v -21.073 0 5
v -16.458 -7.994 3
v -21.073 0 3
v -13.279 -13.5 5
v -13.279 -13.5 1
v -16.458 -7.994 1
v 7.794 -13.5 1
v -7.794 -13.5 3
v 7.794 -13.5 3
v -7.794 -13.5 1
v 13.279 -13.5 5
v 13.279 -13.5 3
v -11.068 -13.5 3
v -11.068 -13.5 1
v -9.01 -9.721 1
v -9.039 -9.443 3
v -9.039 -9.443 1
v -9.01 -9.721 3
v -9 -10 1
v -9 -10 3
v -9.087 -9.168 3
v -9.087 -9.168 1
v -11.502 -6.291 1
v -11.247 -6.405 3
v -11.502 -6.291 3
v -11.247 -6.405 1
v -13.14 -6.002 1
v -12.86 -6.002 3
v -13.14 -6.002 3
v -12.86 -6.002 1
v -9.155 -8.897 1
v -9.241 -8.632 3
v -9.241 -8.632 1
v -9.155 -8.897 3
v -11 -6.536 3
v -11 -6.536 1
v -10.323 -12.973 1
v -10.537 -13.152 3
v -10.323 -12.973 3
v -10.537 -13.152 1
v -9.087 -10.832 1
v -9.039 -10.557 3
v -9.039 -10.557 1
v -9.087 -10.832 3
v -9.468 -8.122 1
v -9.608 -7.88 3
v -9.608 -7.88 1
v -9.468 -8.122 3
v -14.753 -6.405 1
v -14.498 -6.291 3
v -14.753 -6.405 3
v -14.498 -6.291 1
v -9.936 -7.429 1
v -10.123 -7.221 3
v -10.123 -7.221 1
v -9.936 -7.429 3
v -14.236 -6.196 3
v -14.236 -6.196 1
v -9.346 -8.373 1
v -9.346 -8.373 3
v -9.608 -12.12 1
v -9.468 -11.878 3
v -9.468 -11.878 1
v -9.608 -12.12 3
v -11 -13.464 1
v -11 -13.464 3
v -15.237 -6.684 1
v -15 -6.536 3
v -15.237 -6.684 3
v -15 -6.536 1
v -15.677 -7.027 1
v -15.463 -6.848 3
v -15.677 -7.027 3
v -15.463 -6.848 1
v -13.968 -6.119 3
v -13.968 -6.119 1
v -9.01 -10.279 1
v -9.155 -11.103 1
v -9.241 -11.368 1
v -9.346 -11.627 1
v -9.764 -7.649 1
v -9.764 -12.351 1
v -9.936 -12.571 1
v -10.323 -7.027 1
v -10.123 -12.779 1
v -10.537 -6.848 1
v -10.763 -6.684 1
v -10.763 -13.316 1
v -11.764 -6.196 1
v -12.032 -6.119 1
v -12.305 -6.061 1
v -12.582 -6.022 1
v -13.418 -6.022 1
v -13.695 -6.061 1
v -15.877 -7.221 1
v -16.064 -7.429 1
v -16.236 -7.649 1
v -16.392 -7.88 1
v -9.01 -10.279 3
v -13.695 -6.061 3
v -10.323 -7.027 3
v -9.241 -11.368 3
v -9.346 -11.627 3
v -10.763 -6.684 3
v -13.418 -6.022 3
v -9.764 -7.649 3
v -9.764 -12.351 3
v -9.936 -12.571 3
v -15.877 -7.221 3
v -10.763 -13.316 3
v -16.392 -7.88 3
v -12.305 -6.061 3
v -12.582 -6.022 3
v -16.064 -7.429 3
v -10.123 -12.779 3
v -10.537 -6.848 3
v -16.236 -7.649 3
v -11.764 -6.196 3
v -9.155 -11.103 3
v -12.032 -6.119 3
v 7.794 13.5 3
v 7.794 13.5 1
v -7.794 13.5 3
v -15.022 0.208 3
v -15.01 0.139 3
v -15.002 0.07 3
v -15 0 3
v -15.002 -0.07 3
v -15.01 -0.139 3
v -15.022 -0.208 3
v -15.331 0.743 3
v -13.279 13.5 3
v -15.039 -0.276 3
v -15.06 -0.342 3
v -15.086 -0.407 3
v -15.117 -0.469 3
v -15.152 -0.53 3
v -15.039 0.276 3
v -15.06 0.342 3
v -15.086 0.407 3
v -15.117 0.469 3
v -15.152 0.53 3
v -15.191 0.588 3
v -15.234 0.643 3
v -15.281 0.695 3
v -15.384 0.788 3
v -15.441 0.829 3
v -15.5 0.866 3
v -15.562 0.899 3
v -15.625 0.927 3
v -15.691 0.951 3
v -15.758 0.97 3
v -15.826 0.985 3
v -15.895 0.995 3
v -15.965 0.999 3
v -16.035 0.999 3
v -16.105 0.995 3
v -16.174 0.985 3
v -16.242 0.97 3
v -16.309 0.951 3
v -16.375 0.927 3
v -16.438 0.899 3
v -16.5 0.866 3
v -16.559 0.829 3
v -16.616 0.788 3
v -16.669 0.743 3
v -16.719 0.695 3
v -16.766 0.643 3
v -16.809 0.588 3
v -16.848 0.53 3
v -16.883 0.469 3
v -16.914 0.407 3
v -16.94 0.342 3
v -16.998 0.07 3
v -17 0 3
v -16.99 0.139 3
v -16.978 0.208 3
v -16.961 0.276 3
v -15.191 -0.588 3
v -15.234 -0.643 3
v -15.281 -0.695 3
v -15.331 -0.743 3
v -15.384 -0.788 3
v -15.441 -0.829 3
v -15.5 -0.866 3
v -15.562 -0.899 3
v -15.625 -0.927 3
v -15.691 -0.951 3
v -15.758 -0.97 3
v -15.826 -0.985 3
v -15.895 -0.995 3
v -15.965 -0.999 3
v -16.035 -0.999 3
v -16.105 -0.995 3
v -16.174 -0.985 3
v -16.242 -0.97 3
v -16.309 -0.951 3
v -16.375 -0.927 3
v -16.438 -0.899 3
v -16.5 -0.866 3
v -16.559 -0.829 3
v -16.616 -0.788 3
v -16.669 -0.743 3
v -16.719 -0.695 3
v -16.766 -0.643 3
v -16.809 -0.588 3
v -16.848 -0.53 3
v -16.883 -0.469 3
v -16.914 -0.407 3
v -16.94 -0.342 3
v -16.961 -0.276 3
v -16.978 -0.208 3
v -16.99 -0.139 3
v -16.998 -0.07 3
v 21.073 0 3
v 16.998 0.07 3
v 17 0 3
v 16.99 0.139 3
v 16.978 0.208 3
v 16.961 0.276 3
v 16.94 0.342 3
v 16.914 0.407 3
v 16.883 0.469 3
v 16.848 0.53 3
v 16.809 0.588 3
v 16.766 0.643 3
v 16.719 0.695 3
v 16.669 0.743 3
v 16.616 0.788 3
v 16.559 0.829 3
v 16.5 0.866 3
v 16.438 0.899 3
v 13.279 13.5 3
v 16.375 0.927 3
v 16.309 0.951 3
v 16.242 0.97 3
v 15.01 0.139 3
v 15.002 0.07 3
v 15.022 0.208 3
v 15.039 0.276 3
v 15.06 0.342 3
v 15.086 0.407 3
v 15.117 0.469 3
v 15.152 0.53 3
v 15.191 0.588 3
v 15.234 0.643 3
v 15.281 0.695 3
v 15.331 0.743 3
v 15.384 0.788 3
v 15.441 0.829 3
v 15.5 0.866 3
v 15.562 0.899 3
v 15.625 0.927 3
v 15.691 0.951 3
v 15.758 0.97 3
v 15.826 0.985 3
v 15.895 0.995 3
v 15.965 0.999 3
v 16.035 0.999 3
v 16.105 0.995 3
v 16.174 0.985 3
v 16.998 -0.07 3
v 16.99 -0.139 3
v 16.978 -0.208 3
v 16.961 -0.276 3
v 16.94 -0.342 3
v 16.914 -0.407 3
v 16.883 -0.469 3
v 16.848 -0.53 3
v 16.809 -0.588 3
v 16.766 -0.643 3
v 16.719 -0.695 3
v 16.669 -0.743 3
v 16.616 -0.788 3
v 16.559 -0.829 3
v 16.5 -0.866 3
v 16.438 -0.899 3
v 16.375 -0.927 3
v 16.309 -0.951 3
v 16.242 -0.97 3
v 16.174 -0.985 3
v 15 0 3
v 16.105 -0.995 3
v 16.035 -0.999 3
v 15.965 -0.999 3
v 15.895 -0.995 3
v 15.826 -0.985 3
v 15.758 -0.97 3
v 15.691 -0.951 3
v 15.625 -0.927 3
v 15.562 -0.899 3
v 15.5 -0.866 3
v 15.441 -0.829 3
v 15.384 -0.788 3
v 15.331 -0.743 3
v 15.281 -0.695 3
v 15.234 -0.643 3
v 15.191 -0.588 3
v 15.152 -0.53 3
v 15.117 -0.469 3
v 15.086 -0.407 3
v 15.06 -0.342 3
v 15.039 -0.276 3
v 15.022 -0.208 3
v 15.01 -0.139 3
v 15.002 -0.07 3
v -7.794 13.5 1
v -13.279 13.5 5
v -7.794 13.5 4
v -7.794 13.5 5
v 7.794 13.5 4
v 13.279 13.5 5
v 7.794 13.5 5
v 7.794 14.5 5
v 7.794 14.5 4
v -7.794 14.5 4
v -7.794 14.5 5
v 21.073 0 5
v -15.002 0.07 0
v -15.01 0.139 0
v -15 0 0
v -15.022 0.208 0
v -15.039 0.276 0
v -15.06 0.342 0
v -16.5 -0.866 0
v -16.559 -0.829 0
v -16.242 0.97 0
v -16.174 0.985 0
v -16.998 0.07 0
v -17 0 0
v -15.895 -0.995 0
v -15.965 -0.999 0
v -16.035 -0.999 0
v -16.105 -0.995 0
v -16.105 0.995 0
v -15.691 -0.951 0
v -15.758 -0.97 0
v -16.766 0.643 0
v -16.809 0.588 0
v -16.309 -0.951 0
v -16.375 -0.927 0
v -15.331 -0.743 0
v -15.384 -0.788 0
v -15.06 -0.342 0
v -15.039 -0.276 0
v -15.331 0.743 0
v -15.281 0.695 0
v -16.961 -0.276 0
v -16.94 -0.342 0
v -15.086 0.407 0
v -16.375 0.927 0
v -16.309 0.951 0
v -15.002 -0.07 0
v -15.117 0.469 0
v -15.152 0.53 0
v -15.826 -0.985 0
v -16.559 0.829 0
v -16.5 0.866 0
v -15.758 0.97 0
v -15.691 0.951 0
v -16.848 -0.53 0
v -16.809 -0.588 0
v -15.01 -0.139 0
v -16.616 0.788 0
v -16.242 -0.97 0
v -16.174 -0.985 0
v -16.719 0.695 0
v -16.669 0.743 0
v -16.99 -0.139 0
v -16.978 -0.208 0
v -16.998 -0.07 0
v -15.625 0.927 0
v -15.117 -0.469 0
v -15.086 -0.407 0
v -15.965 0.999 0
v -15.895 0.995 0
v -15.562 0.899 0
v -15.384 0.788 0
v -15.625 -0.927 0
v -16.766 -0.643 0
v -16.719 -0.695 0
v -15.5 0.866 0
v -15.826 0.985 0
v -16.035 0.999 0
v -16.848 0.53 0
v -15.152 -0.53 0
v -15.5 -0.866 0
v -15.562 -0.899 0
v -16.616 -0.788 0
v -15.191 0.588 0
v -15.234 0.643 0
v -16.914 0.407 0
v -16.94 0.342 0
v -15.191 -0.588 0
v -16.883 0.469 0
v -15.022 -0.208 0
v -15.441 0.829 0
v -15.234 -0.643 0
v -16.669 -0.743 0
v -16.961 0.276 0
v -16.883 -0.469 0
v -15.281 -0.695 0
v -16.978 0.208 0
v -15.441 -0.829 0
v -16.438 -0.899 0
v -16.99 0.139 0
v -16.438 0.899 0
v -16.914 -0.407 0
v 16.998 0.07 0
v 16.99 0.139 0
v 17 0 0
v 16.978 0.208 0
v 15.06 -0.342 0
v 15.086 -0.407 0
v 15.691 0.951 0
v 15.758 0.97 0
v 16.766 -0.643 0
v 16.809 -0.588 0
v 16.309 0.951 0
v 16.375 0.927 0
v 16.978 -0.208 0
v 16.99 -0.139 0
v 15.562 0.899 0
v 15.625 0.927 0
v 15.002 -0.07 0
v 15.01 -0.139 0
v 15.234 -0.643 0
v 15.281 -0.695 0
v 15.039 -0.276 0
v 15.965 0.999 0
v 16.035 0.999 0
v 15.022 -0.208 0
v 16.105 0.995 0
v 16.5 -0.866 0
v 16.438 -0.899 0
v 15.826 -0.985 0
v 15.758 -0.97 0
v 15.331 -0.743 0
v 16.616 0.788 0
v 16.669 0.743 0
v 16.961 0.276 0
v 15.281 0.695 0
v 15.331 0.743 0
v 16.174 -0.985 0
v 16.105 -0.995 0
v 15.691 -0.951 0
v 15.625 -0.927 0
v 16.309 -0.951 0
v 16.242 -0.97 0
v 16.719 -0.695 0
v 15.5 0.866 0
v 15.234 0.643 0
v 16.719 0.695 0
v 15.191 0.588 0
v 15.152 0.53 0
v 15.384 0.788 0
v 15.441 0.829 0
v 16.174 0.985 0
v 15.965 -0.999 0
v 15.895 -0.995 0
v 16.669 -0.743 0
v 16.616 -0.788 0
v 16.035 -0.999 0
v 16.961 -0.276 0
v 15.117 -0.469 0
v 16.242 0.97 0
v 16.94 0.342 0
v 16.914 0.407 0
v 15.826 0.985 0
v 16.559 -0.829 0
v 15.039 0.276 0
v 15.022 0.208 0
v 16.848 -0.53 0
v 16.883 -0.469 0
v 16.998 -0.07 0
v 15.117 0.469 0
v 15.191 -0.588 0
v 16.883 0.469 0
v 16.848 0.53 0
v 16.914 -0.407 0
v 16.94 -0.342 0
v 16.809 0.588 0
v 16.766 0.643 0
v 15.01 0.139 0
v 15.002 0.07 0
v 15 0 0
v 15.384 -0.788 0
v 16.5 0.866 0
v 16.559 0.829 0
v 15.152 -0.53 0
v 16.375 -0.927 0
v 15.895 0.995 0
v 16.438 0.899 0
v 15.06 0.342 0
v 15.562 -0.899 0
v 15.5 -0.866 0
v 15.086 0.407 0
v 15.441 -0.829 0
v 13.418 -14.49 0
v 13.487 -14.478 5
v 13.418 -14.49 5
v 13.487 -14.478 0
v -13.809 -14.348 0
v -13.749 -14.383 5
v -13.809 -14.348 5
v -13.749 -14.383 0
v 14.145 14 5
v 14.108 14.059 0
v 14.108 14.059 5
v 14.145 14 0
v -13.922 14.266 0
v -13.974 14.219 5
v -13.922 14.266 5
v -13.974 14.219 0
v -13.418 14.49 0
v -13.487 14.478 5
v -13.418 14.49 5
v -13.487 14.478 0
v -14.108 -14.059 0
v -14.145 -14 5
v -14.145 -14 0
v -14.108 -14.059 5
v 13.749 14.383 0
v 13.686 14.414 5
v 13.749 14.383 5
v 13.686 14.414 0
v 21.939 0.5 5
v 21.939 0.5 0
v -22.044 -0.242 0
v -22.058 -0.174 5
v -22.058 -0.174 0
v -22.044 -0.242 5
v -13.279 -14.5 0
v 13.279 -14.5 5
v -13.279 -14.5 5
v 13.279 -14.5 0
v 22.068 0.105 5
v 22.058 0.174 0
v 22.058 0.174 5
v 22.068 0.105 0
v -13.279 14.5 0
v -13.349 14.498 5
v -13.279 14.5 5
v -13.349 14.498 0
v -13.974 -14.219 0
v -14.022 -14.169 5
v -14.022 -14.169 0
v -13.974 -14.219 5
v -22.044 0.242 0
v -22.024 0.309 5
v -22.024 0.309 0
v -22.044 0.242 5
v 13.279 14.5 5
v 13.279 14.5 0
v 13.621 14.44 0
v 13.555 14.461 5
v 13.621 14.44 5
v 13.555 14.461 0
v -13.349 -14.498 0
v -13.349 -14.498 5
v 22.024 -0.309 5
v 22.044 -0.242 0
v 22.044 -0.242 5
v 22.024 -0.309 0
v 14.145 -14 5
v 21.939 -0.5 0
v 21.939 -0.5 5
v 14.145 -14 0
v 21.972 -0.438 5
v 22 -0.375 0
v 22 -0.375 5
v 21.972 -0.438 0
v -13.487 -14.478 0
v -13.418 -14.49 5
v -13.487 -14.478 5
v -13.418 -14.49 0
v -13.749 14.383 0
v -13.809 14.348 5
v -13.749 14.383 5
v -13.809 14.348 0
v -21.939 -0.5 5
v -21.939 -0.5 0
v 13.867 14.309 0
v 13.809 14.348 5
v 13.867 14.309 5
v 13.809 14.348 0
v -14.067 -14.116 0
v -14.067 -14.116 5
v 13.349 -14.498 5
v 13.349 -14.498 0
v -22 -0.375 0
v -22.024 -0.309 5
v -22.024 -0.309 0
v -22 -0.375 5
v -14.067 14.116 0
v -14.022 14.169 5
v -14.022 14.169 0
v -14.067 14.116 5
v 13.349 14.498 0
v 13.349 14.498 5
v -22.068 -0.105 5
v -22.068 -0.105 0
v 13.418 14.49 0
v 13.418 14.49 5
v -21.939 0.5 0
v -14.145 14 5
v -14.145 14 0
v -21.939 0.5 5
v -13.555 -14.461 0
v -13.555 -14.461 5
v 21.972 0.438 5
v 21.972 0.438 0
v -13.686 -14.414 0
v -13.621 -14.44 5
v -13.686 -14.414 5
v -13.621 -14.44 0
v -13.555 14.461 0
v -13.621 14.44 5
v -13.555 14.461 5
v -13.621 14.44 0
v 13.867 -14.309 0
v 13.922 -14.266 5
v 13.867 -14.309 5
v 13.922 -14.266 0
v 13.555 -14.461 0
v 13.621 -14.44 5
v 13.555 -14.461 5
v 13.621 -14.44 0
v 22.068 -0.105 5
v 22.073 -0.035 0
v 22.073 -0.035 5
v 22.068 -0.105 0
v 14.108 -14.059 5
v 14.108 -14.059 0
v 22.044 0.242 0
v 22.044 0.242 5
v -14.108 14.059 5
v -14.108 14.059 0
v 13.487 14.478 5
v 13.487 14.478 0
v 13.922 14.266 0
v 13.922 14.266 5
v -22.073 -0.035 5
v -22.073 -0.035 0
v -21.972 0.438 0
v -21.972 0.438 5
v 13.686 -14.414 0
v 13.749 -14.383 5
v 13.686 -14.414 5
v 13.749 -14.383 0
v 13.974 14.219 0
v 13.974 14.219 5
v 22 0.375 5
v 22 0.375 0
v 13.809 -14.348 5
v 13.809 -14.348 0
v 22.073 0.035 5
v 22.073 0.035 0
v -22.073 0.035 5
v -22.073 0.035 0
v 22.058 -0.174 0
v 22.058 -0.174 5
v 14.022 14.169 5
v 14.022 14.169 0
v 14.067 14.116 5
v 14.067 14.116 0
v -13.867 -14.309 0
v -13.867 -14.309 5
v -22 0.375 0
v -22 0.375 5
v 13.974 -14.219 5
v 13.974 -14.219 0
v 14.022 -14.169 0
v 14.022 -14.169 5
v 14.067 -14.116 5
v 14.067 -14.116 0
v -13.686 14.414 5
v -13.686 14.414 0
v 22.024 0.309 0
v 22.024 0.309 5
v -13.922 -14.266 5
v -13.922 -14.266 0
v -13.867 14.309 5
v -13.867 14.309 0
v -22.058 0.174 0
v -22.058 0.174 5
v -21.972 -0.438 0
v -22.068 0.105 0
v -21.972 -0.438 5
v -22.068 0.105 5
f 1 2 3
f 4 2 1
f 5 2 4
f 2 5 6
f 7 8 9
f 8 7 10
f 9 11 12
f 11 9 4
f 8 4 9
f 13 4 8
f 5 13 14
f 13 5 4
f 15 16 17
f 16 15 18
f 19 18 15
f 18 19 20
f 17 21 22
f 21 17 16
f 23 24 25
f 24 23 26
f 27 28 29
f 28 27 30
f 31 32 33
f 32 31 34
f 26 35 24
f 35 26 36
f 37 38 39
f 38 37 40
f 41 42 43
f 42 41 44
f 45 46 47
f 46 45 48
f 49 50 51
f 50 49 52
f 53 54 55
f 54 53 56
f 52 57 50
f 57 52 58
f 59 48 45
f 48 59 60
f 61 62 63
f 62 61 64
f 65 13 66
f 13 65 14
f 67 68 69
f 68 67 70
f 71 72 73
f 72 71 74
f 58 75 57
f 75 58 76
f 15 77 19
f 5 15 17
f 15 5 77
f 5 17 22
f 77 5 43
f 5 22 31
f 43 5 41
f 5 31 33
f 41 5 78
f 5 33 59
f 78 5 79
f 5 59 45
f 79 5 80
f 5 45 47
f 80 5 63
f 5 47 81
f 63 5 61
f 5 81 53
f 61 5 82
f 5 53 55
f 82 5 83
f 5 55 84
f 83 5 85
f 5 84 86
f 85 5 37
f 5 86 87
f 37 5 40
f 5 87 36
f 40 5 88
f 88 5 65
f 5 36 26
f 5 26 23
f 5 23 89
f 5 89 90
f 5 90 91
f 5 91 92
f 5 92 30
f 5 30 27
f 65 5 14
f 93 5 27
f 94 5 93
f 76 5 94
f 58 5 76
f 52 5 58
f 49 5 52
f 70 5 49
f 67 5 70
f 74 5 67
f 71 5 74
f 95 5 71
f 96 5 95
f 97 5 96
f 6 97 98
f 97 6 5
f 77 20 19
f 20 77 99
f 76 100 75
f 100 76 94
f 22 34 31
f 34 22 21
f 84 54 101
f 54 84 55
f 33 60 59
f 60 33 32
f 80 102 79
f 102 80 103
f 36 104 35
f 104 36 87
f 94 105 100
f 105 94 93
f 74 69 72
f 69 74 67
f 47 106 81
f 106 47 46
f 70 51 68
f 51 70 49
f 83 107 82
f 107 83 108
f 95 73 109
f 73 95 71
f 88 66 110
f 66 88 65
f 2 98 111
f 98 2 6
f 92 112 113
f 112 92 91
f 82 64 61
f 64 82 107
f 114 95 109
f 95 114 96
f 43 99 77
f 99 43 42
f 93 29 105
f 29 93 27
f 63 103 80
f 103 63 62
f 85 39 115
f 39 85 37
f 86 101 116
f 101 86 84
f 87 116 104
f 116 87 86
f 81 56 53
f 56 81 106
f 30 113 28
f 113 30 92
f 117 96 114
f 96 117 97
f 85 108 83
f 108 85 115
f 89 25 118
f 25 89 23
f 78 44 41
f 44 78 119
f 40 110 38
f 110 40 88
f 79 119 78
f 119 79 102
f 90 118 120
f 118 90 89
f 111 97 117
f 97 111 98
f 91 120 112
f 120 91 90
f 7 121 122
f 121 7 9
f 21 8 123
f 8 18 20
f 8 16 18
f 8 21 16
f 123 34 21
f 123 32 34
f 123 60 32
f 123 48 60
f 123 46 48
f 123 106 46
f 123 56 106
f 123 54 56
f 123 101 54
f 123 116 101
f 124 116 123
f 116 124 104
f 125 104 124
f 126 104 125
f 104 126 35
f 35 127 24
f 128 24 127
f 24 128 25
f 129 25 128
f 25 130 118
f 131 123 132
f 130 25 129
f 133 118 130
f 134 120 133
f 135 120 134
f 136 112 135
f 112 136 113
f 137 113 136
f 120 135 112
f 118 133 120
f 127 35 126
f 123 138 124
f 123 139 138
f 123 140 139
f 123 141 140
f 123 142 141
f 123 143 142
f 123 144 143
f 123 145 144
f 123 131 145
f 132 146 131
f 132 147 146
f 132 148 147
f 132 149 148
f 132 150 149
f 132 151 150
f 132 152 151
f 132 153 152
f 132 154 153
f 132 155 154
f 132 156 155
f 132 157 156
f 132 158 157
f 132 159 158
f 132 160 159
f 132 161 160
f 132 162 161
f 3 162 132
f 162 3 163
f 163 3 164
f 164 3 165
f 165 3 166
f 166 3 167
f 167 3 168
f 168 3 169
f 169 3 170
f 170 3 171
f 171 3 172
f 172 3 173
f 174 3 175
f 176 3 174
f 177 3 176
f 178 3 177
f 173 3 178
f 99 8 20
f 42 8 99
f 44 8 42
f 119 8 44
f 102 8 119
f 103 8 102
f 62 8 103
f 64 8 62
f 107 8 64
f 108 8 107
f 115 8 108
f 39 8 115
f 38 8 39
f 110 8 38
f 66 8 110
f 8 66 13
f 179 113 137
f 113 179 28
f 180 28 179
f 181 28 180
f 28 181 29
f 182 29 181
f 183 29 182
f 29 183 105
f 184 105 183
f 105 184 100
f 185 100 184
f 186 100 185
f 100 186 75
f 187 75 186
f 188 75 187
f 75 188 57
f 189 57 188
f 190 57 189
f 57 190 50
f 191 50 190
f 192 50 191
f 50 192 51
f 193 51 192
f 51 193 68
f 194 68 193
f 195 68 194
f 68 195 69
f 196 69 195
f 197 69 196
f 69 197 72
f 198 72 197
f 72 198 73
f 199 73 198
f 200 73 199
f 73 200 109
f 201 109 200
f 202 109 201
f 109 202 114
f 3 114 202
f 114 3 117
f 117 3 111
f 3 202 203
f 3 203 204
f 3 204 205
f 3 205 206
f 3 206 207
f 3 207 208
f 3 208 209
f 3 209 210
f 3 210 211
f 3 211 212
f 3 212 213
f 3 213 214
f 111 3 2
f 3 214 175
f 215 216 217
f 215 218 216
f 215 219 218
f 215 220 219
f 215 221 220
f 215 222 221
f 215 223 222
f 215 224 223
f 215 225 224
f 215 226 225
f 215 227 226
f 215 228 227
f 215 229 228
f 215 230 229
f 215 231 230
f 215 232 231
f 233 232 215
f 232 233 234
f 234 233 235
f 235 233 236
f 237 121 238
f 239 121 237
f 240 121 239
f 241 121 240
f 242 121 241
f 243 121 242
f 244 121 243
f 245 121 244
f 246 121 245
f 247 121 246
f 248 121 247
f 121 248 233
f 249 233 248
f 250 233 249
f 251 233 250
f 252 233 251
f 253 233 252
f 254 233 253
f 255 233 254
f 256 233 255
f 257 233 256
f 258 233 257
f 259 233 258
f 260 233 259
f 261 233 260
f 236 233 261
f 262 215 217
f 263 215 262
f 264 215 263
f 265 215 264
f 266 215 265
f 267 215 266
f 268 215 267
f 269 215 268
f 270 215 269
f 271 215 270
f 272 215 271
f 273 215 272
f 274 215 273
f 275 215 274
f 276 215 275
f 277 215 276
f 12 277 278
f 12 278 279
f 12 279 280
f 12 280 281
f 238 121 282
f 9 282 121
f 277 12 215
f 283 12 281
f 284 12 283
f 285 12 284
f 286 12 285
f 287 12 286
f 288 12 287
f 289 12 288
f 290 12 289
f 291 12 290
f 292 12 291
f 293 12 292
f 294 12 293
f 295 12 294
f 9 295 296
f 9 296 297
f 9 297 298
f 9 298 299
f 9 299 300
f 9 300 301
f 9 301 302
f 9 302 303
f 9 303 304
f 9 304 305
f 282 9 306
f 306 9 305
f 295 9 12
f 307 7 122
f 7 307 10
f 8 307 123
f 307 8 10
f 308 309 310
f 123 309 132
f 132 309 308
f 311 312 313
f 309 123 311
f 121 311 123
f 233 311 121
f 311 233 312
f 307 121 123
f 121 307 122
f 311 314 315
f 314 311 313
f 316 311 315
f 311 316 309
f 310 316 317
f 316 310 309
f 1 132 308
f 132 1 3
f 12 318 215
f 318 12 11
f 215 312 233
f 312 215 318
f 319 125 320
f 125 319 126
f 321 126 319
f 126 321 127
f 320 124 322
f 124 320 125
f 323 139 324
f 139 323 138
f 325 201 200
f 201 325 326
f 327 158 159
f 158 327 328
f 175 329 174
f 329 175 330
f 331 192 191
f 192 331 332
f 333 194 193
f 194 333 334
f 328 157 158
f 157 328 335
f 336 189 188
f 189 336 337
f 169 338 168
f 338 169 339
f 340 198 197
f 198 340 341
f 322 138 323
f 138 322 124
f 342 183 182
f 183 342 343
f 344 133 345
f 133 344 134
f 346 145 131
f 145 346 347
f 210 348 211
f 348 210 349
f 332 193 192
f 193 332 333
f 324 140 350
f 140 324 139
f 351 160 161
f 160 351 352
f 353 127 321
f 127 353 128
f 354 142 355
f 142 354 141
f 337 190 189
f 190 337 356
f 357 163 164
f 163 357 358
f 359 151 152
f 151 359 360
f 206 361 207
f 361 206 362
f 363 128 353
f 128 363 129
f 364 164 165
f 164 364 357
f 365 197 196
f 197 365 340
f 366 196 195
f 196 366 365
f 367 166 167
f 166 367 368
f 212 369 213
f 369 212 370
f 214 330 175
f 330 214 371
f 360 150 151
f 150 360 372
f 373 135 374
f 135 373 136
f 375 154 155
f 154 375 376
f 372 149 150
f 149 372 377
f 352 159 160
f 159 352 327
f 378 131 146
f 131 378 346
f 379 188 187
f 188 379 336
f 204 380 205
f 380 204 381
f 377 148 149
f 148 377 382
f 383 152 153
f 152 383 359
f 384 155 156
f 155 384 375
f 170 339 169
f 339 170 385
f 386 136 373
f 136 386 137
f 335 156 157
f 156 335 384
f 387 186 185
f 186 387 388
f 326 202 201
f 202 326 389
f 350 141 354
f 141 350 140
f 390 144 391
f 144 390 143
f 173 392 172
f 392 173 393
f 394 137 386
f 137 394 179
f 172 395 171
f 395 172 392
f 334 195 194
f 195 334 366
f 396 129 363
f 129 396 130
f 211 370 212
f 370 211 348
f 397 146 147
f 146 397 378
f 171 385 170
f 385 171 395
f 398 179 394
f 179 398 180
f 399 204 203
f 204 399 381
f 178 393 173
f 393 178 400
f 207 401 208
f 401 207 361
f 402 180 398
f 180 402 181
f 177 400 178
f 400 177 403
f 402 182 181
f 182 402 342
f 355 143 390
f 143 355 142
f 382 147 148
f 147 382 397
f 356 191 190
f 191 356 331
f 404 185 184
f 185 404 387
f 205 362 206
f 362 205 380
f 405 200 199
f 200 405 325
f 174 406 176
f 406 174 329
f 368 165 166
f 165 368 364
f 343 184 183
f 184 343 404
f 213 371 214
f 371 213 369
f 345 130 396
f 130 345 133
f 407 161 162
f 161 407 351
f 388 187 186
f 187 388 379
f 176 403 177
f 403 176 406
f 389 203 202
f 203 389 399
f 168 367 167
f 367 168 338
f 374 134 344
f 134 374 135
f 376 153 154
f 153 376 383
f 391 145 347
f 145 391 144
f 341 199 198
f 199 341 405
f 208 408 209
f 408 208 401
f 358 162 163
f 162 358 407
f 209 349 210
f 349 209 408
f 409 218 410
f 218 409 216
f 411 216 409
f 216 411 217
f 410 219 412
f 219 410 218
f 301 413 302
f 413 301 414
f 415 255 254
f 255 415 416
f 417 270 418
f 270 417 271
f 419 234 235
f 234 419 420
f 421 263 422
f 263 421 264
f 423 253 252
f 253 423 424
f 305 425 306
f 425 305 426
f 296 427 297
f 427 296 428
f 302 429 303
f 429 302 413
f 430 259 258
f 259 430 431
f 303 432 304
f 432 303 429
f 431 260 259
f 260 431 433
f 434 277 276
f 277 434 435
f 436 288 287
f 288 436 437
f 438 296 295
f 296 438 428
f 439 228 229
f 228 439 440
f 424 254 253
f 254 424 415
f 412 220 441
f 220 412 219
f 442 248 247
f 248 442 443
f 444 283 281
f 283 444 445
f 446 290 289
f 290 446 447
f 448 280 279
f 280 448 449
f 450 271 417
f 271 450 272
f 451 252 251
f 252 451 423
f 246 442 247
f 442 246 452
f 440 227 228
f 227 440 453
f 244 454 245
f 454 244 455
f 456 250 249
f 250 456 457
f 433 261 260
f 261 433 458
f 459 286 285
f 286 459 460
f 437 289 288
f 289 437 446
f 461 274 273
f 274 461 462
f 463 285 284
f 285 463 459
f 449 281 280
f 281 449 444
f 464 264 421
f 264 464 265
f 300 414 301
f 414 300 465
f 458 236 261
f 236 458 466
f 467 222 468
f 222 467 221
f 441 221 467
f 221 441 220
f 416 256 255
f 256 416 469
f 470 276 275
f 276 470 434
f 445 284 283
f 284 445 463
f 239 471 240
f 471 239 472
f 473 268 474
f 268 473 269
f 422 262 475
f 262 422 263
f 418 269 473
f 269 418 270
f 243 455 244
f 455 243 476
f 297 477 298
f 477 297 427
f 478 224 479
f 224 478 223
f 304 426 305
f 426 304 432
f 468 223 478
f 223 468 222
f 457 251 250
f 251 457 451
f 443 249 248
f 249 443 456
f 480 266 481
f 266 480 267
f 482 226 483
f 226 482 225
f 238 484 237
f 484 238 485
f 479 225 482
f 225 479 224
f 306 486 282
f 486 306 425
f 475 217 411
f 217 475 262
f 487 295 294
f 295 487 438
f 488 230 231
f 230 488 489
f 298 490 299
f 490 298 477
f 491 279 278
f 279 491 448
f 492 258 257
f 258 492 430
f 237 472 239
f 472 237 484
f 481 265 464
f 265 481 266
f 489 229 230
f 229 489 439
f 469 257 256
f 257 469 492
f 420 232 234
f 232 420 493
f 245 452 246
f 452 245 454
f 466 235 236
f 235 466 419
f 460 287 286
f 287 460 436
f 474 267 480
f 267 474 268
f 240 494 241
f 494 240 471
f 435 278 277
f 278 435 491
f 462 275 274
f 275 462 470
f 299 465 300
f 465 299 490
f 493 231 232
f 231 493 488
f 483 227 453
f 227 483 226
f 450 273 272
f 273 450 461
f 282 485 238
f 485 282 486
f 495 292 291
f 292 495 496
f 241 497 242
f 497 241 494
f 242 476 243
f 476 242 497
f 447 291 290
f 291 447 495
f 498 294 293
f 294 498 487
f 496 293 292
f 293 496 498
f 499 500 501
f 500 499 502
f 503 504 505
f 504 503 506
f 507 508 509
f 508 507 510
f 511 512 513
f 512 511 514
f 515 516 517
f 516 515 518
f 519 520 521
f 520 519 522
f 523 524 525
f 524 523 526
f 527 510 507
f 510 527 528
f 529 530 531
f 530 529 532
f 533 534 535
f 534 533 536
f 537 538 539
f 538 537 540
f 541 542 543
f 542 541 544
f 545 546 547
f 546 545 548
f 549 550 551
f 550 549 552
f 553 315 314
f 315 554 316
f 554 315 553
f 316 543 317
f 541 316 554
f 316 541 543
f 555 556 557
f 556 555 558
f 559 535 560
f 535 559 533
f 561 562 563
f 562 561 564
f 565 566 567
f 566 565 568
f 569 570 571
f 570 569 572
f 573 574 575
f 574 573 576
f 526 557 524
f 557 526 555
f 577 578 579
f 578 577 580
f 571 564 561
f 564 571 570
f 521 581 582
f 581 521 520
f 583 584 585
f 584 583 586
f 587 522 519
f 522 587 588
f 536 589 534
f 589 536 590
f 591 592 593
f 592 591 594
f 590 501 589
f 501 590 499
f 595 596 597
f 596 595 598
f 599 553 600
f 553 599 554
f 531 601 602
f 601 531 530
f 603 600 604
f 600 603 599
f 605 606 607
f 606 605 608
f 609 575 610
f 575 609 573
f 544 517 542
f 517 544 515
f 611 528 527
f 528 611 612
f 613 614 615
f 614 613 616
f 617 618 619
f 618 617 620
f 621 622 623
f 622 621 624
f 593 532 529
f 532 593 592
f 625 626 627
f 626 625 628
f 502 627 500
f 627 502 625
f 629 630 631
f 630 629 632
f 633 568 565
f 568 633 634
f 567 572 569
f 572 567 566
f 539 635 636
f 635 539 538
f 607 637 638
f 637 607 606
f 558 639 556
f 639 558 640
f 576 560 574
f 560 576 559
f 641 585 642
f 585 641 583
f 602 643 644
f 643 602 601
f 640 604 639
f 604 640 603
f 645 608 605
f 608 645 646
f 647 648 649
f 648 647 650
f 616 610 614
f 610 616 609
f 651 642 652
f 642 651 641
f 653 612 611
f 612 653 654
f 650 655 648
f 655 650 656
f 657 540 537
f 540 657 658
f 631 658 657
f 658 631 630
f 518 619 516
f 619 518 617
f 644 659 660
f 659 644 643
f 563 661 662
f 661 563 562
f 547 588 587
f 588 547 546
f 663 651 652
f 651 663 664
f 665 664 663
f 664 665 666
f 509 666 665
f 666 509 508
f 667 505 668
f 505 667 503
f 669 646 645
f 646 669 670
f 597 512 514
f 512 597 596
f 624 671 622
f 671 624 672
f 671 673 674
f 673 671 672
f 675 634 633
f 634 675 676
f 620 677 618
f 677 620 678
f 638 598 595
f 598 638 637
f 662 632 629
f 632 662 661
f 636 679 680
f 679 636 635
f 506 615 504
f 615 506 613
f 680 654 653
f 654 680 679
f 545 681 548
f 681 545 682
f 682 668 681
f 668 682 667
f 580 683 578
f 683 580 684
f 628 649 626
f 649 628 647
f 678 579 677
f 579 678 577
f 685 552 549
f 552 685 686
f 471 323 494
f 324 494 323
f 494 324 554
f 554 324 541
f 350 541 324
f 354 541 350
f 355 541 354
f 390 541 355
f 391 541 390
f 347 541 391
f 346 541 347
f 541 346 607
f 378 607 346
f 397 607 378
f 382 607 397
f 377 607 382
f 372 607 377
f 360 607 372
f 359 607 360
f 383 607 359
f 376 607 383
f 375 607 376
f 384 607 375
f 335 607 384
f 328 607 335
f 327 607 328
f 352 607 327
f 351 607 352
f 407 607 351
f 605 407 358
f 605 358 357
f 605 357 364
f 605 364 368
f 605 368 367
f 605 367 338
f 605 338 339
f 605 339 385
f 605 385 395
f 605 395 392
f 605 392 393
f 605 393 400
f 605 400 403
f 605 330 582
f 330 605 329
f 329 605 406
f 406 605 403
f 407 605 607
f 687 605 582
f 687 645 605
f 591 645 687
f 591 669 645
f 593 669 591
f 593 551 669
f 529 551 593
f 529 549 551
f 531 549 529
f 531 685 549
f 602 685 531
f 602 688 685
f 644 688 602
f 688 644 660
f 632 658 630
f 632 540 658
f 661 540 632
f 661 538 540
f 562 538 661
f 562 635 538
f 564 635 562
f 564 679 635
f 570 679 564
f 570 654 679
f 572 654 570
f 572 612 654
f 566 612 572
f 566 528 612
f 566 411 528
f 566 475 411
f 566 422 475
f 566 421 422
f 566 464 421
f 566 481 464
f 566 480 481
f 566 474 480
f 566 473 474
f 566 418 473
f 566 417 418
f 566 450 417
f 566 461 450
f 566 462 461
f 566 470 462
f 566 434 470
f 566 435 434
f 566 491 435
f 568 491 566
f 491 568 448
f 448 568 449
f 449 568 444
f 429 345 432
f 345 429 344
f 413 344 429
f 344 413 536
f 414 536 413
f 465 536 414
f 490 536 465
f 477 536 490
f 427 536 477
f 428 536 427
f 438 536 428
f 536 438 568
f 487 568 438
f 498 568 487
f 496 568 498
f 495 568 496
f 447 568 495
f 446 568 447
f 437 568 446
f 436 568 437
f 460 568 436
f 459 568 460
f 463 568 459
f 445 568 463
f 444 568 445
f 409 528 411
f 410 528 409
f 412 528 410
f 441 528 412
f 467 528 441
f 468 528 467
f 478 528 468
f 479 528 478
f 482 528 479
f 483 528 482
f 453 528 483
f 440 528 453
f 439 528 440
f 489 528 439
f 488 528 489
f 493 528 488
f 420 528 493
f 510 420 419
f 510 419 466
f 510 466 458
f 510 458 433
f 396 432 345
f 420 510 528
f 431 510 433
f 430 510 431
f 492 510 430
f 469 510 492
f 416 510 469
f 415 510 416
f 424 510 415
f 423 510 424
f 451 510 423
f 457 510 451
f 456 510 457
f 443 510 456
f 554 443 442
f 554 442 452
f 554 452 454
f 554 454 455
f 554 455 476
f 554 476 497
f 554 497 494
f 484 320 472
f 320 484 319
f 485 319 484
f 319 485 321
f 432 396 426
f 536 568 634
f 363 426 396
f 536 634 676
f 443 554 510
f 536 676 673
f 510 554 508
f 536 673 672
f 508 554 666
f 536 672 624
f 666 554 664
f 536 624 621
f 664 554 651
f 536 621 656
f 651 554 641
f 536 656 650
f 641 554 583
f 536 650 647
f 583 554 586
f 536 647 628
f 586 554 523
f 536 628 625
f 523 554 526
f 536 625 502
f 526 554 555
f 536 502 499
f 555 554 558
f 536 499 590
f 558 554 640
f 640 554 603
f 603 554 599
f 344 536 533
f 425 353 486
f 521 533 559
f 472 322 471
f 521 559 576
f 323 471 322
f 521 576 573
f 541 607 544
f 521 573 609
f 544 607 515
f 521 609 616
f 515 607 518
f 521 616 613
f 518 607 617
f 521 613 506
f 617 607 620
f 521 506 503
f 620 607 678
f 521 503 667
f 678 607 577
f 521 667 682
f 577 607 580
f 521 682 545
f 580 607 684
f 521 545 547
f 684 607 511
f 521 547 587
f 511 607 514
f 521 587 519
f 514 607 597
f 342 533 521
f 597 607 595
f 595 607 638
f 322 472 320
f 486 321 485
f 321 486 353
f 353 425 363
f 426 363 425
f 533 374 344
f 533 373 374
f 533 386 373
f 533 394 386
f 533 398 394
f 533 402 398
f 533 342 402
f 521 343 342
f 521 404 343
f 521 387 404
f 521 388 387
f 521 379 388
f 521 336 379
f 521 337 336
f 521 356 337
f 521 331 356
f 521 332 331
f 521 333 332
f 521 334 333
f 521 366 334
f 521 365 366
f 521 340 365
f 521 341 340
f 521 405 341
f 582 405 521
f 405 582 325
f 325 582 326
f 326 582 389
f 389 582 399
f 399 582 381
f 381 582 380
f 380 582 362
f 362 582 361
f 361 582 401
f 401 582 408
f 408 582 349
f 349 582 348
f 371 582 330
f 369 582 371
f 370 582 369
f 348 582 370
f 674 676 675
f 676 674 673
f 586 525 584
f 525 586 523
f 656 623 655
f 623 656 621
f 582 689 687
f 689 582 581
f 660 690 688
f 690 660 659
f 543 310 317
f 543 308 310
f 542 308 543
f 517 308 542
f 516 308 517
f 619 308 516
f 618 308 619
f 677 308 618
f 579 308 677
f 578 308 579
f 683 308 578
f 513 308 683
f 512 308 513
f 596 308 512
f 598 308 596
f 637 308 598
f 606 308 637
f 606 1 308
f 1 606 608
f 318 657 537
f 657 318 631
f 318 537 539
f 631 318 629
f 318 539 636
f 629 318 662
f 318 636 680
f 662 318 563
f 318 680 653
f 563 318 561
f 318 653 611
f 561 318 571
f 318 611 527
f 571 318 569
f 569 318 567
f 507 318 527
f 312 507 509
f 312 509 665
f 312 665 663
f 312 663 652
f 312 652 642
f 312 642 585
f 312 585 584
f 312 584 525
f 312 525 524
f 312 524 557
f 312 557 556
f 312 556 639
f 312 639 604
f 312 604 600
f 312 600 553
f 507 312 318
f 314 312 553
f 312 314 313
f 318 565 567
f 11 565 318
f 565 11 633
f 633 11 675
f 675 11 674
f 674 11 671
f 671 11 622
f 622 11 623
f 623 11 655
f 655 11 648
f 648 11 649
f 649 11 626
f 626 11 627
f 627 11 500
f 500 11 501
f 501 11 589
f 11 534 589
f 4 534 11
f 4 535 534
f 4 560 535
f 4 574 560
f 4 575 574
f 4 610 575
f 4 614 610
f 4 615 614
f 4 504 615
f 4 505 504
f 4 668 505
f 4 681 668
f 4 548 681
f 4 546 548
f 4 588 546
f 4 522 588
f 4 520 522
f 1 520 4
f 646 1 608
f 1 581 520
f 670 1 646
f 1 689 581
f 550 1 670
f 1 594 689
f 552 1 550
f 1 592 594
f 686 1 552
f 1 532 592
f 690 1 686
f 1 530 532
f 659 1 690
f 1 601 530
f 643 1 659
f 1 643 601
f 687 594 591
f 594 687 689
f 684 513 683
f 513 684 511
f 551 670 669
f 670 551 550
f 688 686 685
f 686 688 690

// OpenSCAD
// zum module 1
// hexagonal module

$fn = 90;
drill = 2;

module holes() {
    d = 32;
    translate( [ -d/2, 0, -1 ] ) cylinder( d = drill, h = 11 );
    translate( [ d/2, 0, -1 ] ) cylinder( d = drill, h = 11 );
}

module hexagon( ) {
    h = 27;
    b = 36.5;
    
    intersection() {
        square( [ 100, h ], center = true );
        rotate( 60 ) square( [ 100, b ], center = true );
        rotate( -60 ) square( [ 100, b ], center = true );
    }
    
}

module zum_hexmodule_clearance( h = 27 ) {
    ri = h/2;
    ro = ri / ( 0.5 * sqrt(3) );
    translate( [ -ro/2, -ri, -2 ] ) cube( [ ro, ri * 2, 2 ] );
    translate( [ -ro/2, ri/2, 1 ] ) cube( [ ro, ri, 8 ] );
    
    intersection () {
        translate( [ 0, 0, -3 ] ) linear_extrude( height = 15 ) hexagon();
        translate( [ -13, -10, -2 ] ) cylinder( d = 8, h = 10 );
    }
}

module zum_hexmodule() {
    difference() {
        linear_extrude( height = 5 ) offset( r = 1 ) hexagon();
        translate( [ 0, 0, 3 ] ) {
            linear_extrude( height = 5 ) hexagon();
            zum_hexmodule_clearance();
        }
        holes();
    }
}

zum_hexmodule();
